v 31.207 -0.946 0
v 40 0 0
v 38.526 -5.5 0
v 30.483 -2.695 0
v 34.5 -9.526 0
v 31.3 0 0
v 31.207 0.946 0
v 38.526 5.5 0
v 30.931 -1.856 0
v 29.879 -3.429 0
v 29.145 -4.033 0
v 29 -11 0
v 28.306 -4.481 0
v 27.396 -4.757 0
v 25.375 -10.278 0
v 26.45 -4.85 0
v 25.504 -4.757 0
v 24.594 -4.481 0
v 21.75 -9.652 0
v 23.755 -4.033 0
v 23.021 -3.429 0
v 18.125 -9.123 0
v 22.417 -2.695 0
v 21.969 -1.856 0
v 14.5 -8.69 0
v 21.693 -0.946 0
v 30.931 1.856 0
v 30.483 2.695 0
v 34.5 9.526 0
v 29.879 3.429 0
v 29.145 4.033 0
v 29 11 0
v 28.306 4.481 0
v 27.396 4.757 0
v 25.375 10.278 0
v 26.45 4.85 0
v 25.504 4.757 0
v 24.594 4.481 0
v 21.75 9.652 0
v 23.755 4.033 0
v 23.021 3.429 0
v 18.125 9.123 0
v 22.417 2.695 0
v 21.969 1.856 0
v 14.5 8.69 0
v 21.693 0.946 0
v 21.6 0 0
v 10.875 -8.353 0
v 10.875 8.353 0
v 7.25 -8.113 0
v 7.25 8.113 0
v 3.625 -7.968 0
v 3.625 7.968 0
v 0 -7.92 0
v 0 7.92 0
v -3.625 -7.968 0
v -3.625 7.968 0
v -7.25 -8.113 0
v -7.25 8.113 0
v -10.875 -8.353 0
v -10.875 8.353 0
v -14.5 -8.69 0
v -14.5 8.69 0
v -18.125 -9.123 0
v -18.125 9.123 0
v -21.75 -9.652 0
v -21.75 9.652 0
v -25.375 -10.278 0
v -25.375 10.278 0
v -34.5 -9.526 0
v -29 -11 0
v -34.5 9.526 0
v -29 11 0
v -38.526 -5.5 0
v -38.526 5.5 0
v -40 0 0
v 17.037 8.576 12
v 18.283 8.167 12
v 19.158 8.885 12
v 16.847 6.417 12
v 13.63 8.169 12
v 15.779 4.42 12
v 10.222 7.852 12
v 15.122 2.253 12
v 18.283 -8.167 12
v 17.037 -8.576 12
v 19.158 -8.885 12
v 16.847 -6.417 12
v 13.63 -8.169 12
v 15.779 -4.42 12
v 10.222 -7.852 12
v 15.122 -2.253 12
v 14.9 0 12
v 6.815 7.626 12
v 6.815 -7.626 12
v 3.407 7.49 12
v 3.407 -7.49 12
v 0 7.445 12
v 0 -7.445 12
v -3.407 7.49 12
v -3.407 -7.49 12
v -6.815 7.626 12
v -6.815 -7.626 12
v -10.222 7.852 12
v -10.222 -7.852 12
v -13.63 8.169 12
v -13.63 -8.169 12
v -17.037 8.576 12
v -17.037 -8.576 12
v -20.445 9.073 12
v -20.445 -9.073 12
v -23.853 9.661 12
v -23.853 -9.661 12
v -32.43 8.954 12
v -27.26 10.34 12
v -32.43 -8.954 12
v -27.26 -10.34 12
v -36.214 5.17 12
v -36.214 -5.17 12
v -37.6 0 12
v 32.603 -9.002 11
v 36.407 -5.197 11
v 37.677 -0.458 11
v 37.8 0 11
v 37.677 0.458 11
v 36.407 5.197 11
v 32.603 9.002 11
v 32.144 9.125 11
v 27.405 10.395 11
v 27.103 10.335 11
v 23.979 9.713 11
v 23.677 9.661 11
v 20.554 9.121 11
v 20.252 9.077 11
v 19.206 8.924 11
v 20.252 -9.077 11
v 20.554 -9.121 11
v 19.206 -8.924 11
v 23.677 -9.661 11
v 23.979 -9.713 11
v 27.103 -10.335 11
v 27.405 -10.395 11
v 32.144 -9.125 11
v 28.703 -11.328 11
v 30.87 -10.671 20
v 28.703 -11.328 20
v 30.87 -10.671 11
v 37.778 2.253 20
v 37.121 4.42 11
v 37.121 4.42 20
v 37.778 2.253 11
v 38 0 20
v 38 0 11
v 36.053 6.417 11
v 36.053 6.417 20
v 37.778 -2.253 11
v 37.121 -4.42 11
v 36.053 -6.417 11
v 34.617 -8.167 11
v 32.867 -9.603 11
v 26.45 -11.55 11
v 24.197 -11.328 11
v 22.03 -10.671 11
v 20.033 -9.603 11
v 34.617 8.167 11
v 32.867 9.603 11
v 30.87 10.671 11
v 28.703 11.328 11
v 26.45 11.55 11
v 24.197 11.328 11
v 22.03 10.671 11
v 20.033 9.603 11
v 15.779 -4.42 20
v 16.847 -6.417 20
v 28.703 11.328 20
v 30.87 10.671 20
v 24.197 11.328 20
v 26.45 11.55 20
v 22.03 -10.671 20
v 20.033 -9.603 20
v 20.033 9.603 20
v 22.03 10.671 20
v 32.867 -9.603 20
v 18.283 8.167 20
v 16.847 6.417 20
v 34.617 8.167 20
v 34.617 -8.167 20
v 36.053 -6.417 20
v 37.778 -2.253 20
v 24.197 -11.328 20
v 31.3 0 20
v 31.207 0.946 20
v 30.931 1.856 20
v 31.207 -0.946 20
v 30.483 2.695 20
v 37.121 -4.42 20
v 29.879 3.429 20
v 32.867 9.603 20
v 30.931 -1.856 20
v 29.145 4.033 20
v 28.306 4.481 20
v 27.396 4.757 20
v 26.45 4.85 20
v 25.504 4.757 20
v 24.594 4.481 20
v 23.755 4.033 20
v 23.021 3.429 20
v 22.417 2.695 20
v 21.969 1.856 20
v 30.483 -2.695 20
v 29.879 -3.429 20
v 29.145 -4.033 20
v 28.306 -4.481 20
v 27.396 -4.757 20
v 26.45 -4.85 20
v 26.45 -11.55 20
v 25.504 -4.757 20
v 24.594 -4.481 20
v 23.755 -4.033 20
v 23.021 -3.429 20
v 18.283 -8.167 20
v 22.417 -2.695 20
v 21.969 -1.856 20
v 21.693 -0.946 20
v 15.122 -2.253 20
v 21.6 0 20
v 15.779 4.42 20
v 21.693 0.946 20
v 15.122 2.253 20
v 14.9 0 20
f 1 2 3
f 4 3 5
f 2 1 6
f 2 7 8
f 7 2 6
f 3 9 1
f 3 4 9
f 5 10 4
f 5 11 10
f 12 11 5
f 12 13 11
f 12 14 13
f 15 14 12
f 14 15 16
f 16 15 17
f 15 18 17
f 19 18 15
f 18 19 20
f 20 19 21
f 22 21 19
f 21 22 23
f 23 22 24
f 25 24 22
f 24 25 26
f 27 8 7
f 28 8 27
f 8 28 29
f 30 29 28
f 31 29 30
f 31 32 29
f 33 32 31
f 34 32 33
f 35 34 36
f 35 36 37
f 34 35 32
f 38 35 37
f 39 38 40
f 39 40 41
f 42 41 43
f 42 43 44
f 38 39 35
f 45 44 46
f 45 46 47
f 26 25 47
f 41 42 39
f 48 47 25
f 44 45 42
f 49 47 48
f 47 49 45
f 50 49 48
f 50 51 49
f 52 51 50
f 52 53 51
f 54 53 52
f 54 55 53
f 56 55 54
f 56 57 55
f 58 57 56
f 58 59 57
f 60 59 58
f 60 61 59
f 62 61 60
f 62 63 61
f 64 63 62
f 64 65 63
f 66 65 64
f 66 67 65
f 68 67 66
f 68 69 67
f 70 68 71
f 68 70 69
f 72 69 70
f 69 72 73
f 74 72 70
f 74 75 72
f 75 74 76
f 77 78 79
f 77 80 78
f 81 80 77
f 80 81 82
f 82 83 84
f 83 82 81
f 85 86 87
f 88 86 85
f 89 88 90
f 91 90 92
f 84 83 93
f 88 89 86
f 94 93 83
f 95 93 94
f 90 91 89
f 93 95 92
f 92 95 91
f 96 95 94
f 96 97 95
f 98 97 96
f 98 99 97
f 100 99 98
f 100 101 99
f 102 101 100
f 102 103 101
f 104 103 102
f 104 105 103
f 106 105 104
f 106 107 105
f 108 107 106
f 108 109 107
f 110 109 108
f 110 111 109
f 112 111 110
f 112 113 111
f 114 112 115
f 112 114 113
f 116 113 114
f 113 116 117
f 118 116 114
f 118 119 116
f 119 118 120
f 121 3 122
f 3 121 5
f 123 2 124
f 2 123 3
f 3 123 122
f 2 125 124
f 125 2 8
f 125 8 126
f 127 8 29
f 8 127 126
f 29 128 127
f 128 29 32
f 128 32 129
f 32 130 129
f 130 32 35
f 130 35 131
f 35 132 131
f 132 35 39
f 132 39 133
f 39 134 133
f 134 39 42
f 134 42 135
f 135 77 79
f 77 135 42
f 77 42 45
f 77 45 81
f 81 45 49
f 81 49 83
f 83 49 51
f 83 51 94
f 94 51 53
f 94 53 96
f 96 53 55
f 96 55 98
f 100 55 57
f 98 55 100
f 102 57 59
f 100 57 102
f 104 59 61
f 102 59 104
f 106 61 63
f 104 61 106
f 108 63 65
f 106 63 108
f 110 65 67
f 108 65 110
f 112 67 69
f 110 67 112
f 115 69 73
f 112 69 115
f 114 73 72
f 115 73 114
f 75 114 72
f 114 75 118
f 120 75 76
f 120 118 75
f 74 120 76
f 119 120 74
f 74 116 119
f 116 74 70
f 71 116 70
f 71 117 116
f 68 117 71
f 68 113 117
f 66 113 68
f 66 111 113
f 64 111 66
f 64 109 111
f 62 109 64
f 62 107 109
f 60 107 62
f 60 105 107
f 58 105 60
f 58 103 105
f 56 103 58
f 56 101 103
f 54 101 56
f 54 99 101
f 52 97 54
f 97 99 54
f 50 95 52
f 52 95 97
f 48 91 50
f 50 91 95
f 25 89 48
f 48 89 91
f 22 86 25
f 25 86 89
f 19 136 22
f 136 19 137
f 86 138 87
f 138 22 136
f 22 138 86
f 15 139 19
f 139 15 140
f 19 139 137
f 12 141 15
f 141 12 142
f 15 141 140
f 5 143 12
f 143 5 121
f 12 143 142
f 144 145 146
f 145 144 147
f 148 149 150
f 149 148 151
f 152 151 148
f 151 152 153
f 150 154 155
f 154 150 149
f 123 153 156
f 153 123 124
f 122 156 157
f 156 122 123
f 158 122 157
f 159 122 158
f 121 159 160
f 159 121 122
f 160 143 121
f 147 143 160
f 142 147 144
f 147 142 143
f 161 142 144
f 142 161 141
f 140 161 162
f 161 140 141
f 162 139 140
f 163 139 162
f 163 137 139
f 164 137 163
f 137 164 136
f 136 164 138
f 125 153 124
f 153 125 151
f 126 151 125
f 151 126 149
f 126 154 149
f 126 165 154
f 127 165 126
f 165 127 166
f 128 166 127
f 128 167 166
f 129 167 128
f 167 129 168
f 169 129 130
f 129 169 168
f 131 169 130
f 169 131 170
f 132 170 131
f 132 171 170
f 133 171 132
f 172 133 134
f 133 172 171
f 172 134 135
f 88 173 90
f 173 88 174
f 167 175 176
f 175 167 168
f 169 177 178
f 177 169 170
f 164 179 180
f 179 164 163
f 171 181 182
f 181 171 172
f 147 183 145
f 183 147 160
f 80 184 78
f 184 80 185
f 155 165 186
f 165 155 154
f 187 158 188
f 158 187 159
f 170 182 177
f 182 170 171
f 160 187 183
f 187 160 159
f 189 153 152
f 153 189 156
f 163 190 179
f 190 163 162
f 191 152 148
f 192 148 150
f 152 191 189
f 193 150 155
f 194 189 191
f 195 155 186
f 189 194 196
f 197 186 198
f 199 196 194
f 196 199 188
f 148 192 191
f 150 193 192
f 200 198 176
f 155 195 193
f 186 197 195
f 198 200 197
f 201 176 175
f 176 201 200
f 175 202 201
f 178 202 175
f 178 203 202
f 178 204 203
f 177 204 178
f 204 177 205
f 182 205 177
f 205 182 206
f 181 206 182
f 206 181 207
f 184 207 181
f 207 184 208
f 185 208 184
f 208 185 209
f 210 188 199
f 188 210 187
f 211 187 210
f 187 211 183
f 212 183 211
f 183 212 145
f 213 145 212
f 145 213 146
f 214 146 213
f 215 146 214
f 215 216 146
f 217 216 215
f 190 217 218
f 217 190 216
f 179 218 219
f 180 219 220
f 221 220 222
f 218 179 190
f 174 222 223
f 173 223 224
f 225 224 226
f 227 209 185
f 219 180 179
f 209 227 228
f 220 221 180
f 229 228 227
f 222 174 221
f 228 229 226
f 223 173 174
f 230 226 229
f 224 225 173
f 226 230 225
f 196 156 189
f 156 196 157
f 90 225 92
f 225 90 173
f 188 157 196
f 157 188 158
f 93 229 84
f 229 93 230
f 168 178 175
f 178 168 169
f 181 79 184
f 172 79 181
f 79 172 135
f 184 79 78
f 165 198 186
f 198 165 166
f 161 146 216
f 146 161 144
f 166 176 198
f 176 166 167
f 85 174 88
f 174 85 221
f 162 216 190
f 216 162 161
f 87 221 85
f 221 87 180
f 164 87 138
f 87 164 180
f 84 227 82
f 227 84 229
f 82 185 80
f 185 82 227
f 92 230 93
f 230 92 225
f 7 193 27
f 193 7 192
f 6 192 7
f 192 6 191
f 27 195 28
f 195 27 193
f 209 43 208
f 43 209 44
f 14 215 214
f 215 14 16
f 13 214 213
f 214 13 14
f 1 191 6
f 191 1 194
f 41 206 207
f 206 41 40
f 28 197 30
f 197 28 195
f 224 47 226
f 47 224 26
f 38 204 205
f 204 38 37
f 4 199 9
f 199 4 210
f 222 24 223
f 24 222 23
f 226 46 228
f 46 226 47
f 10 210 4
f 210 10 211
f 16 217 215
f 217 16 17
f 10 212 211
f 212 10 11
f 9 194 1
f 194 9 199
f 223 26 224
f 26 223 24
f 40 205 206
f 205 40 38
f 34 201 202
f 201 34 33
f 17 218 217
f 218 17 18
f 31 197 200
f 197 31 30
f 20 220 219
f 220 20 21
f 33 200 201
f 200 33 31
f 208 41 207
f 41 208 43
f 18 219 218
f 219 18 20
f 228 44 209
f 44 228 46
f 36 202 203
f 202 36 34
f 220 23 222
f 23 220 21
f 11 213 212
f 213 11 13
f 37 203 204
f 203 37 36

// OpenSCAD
$fn = 32;

// ----------------------------------------------------------------------
// Handle: 80 x 22 mm grip, 12 mm thick
// ----------------------------------------------------------------------

// --- parameters (mm) ---
length = 80;              // grip length
width = 22;               // grip width
thickness = 12;           // grip thickness
waist = 0.72;             // width factor at the middle
draft = 0.94;             // top face scale of the extrusion
boss_d = 23.1;            // mounting boss diameter
boss_h = 8;               // mounting boss height
boss_hole_d = 9.7;        // screw clearance through the boss
boss_r = 26.45;           // boss centre from the grip centre

/* ergonomic grip outline, closed spline-like polygon in the XY plane */
grip = [[-29, 11], [-25.375, 10.278], [-21.75, 9.652], [-18.125, 9.123], [-14.5, 8.69], [-10.875, 8.353], [-7.25, 8.113], [-3.625, 7.968], [0, 7.92], [3.625, 7.968], [7.25, 8.113], [10.875, 8.353], [14.5, 8.69], [18.125, 9.123], [21.75, 9.652], [25.375, 10.278], [29, 11], [34.5, 9.526], [38.526, 5.5], [40, 0], [38.526, -5.5], [34.5, -9.526], [29, -11], [29, -11], [25.375, -10.278], [21.75, -9.652], [18.125, -9.123], [14.5, -8.69], [10.875, -8.353], [7.25, -8.113], [3.625, -7.968], [0, -7.92], [-3.625, -7.968], [-7.25, -8.113], [-10.875, -8.353], [-14.5, -8.69], [-18.125, -9.123], [-21.75, -9.652], [-25.375, -10.278], [-29, -11], [-34.5, -9.526], [-38.526, -5.5], [-40, 0], [-38.526, 5.5], [-34.5, 9.526], [-29, 11]];

module grip_body() {
  linear_extrude(height = thickness, scale = draft) polygon(grip);
}

module boss_body() {
  /* sunk 1 mm into the grip so the joint overlaps */
  translate([boss_r, 0, thickness - 1]) cylinder(h = boss_h + 1, d = boss_d);
}

difference() {
  union() {
    grip_body();
    boss_body();
  }
  translate([boss_r, 0, -1]) cylinder(h = thickness + boss_h + 2, d = boss_hole_d);
}
